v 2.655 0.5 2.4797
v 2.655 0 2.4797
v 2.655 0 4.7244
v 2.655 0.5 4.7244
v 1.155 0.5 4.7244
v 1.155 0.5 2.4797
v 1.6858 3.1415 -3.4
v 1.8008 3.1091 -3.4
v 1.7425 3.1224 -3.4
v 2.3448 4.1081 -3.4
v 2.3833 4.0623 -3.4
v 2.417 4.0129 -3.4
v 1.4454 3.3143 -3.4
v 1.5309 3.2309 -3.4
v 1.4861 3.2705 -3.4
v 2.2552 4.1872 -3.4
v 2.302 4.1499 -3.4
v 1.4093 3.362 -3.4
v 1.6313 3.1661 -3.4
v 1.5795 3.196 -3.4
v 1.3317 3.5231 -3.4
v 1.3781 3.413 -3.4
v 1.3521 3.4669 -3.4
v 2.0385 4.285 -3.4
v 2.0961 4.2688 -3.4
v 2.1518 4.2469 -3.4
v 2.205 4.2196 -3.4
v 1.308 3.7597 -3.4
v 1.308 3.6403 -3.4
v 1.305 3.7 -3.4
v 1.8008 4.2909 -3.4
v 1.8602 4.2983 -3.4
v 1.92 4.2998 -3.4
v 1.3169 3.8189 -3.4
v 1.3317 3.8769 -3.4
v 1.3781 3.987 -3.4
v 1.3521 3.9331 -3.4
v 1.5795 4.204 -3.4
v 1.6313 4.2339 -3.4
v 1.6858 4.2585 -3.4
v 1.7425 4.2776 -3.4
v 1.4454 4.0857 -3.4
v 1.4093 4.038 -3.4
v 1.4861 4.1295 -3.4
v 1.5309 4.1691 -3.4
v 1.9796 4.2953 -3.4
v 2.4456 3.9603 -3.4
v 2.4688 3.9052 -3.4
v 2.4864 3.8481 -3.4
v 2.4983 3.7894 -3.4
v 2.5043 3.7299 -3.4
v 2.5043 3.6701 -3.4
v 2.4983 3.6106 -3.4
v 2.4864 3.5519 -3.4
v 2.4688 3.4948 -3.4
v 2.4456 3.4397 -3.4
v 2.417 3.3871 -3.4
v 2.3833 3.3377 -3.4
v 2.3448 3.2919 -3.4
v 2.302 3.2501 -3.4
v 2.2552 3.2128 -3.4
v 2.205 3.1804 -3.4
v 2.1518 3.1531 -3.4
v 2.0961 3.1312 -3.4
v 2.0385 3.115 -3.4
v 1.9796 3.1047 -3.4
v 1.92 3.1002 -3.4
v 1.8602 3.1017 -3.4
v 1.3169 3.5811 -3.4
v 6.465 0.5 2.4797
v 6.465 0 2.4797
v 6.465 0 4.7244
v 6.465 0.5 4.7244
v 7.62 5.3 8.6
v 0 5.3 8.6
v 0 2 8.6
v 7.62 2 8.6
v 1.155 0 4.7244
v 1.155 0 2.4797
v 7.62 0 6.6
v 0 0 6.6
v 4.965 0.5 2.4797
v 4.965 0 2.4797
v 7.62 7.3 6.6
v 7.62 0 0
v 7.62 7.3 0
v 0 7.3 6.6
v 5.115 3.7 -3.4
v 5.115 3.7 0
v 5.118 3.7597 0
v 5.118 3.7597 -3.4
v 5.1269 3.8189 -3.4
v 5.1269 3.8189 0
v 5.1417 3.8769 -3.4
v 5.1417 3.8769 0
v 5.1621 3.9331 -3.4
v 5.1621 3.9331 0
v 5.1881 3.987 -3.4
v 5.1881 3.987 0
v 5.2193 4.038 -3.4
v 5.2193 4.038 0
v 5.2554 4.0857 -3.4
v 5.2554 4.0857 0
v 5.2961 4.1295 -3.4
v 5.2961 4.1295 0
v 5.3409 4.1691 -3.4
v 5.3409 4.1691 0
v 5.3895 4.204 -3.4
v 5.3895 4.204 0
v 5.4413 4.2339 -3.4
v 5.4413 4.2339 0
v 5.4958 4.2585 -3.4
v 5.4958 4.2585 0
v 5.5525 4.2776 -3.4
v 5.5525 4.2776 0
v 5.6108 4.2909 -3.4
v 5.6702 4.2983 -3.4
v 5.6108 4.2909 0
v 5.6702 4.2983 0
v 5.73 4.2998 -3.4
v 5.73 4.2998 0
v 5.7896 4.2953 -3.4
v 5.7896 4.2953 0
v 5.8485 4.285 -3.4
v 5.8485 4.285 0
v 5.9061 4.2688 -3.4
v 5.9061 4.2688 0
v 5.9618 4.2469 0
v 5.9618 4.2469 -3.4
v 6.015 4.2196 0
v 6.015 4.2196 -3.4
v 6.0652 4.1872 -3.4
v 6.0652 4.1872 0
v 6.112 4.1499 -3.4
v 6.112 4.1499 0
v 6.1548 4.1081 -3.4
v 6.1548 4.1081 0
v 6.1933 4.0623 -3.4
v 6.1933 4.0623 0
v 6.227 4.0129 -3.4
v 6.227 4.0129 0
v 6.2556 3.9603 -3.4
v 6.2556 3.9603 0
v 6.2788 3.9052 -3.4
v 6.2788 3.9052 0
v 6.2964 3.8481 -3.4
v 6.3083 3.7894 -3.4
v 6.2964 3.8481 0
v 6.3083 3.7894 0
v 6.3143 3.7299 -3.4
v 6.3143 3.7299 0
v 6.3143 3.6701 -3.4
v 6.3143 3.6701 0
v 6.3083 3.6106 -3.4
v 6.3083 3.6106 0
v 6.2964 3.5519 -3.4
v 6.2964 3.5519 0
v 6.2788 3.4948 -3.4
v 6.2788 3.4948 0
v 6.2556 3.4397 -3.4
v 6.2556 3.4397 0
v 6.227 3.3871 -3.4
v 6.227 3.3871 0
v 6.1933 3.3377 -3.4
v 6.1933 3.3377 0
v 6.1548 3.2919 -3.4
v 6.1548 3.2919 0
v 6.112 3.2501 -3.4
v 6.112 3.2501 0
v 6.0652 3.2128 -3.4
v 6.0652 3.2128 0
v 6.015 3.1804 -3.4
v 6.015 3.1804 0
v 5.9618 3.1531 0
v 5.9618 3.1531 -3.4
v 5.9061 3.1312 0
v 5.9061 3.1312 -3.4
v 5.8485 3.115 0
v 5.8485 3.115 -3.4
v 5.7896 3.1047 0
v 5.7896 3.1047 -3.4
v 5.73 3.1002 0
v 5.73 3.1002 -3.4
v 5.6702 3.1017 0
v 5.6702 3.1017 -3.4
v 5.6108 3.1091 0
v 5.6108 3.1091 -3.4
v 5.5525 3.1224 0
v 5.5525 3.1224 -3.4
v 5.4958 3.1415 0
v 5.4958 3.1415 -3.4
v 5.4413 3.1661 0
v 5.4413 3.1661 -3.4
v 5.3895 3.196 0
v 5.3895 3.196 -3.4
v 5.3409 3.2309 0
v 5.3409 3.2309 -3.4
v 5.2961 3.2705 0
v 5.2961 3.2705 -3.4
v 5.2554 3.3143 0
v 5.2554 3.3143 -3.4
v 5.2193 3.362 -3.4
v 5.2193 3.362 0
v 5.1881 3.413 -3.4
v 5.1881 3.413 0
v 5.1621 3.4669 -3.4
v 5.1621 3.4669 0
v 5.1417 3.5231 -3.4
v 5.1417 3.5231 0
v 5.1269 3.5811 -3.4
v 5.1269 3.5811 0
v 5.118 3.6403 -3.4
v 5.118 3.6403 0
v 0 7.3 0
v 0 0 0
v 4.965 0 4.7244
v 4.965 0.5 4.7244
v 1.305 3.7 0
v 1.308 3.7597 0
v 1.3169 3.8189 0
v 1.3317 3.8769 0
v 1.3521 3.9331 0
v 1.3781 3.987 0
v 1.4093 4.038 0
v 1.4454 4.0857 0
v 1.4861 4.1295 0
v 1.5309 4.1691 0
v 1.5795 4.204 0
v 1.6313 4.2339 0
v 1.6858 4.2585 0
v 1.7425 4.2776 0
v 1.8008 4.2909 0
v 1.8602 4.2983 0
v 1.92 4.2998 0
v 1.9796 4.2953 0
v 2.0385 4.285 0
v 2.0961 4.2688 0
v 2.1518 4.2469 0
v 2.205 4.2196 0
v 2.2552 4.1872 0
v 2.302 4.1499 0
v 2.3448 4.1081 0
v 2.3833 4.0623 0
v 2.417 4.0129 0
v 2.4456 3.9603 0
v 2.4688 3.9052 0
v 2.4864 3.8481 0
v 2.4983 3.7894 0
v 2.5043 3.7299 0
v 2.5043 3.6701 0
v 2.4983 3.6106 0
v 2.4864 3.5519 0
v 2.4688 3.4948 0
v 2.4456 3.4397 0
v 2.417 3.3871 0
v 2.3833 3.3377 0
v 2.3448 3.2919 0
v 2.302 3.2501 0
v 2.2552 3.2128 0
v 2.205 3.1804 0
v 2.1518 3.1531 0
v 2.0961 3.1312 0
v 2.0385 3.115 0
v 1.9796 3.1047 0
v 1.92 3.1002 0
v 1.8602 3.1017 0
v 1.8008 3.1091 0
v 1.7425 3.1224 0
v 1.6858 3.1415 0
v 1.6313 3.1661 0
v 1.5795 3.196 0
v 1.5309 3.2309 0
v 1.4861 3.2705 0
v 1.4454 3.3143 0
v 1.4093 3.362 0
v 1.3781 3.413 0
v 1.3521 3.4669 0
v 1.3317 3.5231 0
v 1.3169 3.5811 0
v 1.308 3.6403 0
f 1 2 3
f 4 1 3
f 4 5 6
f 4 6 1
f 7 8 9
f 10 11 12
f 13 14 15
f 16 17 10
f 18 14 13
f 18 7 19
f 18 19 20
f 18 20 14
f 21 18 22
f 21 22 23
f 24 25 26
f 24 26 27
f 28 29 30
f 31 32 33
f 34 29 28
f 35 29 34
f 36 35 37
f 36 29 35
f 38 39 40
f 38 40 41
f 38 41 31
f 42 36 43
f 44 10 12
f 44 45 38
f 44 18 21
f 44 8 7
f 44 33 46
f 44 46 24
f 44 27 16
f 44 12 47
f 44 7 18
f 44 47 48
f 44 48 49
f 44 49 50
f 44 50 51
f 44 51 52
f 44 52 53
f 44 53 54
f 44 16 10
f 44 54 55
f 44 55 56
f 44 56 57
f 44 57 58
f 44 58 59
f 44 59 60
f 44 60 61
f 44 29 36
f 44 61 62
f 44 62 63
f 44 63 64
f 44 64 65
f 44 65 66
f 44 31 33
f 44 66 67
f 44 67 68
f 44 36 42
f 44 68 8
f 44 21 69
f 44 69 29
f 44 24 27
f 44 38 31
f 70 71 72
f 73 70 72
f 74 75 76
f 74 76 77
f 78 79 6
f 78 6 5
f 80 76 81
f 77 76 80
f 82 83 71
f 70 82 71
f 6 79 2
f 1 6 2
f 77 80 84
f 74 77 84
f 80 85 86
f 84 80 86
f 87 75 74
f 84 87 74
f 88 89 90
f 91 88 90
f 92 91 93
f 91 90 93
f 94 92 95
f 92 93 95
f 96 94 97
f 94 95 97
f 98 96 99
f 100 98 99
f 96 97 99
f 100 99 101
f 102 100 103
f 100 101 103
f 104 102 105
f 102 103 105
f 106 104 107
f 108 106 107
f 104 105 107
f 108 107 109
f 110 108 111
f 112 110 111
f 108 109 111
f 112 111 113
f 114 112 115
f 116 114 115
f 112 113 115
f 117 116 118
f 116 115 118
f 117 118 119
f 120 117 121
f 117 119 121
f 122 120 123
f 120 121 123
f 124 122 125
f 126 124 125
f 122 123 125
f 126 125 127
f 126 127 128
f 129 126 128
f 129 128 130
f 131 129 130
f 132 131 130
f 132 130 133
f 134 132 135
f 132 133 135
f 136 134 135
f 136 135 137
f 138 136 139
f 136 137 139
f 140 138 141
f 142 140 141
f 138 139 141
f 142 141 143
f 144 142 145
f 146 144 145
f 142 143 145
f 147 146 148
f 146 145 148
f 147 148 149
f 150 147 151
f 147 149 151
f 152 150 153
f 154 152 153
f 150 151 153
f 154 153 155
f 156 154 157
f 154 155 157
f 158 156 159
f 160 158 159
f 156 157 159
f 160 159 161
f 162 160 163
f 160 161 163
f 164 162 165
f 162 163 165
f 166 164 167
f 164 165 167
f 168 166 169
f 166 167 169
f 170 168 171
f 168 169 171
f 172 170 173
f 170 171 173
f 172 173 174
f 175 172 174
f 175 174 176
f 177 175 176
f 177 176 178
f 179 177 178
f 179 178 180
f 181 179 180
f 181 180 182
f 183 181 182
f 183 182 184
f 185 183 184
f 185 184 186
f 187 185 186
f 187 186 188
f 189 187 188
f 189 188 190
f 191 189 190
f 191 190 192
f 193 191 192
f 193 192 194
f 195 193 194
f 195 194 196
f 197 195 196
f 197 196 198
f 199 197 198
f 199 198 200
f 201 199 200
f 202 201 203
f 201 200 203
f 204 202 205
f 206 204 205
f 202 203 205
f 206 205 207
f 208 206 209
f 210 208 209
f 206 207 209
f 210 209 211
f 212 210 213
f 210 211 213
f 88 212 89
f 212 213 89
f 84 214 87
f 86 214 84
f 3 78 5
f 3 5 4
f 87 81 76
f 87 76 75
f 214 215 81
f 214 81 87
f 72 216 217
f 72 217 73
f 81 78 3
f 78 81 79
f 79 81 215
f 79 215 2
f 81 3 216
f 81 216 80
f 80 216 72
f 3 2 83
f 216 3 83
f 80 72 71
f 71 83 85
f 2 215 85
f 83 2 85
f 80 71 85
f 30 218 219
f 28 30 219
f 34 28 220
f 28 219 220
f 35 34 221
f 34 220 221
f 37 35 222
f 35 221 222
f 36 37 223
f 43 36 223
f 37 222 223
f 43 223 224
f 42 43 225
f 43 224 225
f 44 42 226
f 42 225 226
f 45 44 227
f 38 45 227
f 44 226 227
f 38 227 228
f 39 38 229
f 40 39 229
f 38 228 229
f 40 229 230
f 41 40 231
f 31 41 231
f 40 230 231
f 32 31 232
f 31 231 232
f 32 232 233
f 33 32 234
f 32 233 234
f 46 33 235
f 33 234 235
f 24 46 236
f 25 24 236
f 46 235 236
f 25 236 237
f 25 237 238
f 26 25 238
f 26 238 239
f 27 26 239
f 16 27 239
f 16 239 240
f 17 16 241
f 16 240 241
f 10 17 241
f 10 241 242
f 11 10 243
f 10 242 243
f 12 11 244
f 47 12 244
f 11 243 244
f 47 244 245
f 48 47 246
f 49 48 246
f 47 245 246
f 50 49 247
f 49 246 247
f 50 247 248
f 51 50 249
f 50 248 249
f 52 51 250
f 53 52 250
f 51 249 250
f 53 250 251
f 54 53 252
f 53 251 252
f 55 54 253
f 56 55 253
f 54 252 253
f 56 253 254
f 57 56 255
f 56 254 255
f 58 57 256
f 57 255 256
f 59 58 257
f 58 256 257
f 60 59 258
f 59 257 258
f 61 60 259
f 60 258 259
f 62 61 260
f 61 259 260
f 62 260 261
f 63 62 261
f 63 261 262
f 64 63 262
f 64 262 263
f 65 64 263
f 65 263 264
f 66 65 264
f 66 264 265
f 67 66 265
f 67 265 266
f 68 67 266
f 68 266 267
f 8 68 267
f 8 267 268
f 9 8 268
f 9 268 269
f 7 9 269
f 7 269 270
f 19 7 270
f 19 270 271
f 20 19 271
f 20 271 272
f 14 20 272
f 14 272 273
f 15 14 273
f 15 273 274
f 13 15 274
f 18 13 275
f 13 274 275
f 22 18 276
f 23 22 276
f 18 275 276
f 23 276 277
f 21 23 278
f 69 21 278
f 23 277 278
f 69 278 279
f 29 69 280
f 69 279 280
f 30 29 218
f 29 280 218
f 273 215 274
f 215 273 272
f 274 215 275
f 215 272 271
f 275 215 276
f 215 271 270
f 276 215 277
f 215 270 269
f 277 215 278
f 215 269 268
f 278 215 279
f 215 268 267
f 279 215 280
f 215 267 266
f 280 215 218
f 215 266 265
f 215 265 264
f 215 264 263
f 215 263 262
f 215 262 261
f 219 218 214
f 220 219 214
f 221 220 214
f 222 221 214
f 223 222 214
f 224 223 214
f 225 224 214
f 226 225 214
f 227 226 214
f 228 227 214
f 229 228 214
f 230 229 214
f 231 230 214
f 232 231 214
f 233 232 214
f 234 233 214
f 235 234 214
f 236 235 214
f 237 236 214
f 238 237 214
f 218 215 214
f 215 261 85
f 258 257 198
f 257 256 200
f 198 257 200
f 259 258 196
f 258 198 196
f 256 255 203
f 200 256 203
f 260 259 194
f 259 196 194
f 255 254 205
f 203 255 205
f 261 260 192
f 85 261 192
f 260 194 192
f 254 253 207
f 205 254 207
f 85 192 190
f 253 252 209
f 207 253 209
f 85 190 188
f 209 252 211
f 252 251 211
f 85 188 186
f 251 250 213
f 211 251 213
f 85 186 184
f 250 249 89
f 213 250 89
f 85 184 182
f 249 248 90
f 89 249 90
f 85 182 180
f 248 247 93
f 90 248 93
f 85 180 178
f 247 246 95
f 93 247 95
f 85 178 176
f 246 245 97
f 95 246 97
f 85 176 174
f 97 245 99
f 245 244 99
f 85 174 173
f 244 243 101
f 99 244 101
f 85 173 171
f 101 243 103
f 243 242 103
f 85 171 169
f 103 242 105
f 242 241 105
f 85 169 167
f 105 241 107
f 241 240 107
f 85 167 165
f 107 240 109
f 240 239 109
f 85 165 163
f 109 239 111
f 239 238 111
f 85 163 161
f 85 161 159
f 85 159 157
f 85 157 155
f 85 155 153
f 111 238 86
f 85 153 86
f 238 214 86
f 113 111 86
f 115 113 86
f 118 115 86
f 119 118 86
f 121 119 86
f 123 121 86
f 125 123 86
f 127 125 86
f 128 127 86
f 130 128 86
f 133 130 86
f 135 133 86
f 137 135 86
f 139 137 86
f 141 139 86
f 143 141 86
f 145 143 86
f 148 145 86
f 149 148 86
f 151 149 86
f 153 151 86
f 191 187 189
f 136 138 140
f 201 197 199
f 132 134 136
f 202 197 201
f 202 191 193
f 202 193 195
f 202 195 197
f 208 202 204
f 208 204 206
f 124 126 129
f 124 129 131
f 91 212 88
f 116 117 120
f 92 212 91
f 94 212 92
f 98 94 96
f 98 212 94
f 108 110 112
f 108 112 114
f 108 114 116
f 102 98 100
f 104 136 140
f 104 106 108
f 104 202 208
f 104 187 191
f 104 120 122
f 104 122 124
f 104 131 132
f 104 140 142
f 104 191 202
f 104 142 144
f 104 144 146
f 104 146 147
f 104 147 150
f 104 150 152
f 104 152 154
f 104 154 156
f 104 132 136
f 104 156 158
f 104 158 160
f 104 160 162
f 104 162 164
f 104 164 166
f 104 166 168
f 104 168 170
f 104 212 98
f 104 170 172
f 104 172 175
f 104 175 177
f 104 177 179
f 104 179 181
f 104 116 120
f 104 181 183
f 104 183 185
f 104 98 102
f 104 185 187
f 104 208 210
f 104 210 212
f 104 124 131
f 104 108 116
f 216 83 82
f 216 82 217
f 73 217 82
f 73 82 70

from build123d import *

# Parameters (mm, degrees)
SKETCH_1_W             = 7.62
SKETCH_1_H             = 7.3
EXTRUDE_1_DEPTH        = 8.6
CHAMFER_1_SIZE         = 2
SKETCH_2_W             = 1.5
SKETCH_2_H             = 2.244760595
CUT_EXTRUDE_1_DEPTH    = 0.5
PATTERN_LINEAR_1_COUNT = 2
PATTERN_LINEAR_1_PITCH = 3.81
SKETCH_3_R             = 0.6
EXTRUDE_2_DEPTH        = 3.4
PATTERN_LINEAR_2_COUNT = 2
PATTERN_LINEAR_2_PITCH = 3.81


with BuildPart() as part:
    # 草图1 → 凸台-拉伸1 (new body)
    with BuildSketch(Plane.XY):
        with Locations((3.81, 3.65)):
            Rectangle(SKETCH_1_W, SKETCH_1_H)
    extrude(amount=EXTRUDE_1_DEPTH)

    # 倒角1
    chamfer_1_edges = [part.edges().sort_by_distance(p)[0] for p in [
        (3.81, 7.3, 8.6),
        (3.81, 0, 8.6),
    ]]
    chamfer(chamfer_1_edges, length=CHAMFER_1_SIZE)

    # 草图2 → 切除-拉伸1 (cut)
    with BuildSketch(Plane.XZ):
        with Locations((1.905, 3.602057757)):
            Rectangle(SKETCH_2_W, SKETCH_2_H)
    cut_extrude_1 = extrude(amount=-CUT_EXTRUDE_1_DEPTH, mode=Mode.SUBTRACT)

    # 阵列(线性)1: 切除-拉伸1 ×2
    with Locations(*[(i * PATTERN_LINEAR_1_PITCH, 0, 0) for i in range(1, PATTERN_LINEAR_1_COUNT)]):
        add(cut_extrude_1, mode=Mode.SUBTRACT)

    # 草图3 → 凸台-拉伸2 (add)
    with BuildSketch(Plane(origin=(0, 0, 0), x_dir=(-1, 0, 0), z_dir=(0, 0, -1))):
        with Locations((-5.715, 3.7)):
            Circle(SKETCH_3_R)
    extrude_2 = extrude(amount=EXTRUDE_2_DEPTH)

    # 阵列(线性)2: 凸台-拉伸2 ×2
    with Locations(*[(-i * PATTERN_LINEAR_2_PITCH, 0, 0) for i in range(1, PATTERN_LINEAR_2_COUNT)]):
        add(extrude_2)


solid = part.part
